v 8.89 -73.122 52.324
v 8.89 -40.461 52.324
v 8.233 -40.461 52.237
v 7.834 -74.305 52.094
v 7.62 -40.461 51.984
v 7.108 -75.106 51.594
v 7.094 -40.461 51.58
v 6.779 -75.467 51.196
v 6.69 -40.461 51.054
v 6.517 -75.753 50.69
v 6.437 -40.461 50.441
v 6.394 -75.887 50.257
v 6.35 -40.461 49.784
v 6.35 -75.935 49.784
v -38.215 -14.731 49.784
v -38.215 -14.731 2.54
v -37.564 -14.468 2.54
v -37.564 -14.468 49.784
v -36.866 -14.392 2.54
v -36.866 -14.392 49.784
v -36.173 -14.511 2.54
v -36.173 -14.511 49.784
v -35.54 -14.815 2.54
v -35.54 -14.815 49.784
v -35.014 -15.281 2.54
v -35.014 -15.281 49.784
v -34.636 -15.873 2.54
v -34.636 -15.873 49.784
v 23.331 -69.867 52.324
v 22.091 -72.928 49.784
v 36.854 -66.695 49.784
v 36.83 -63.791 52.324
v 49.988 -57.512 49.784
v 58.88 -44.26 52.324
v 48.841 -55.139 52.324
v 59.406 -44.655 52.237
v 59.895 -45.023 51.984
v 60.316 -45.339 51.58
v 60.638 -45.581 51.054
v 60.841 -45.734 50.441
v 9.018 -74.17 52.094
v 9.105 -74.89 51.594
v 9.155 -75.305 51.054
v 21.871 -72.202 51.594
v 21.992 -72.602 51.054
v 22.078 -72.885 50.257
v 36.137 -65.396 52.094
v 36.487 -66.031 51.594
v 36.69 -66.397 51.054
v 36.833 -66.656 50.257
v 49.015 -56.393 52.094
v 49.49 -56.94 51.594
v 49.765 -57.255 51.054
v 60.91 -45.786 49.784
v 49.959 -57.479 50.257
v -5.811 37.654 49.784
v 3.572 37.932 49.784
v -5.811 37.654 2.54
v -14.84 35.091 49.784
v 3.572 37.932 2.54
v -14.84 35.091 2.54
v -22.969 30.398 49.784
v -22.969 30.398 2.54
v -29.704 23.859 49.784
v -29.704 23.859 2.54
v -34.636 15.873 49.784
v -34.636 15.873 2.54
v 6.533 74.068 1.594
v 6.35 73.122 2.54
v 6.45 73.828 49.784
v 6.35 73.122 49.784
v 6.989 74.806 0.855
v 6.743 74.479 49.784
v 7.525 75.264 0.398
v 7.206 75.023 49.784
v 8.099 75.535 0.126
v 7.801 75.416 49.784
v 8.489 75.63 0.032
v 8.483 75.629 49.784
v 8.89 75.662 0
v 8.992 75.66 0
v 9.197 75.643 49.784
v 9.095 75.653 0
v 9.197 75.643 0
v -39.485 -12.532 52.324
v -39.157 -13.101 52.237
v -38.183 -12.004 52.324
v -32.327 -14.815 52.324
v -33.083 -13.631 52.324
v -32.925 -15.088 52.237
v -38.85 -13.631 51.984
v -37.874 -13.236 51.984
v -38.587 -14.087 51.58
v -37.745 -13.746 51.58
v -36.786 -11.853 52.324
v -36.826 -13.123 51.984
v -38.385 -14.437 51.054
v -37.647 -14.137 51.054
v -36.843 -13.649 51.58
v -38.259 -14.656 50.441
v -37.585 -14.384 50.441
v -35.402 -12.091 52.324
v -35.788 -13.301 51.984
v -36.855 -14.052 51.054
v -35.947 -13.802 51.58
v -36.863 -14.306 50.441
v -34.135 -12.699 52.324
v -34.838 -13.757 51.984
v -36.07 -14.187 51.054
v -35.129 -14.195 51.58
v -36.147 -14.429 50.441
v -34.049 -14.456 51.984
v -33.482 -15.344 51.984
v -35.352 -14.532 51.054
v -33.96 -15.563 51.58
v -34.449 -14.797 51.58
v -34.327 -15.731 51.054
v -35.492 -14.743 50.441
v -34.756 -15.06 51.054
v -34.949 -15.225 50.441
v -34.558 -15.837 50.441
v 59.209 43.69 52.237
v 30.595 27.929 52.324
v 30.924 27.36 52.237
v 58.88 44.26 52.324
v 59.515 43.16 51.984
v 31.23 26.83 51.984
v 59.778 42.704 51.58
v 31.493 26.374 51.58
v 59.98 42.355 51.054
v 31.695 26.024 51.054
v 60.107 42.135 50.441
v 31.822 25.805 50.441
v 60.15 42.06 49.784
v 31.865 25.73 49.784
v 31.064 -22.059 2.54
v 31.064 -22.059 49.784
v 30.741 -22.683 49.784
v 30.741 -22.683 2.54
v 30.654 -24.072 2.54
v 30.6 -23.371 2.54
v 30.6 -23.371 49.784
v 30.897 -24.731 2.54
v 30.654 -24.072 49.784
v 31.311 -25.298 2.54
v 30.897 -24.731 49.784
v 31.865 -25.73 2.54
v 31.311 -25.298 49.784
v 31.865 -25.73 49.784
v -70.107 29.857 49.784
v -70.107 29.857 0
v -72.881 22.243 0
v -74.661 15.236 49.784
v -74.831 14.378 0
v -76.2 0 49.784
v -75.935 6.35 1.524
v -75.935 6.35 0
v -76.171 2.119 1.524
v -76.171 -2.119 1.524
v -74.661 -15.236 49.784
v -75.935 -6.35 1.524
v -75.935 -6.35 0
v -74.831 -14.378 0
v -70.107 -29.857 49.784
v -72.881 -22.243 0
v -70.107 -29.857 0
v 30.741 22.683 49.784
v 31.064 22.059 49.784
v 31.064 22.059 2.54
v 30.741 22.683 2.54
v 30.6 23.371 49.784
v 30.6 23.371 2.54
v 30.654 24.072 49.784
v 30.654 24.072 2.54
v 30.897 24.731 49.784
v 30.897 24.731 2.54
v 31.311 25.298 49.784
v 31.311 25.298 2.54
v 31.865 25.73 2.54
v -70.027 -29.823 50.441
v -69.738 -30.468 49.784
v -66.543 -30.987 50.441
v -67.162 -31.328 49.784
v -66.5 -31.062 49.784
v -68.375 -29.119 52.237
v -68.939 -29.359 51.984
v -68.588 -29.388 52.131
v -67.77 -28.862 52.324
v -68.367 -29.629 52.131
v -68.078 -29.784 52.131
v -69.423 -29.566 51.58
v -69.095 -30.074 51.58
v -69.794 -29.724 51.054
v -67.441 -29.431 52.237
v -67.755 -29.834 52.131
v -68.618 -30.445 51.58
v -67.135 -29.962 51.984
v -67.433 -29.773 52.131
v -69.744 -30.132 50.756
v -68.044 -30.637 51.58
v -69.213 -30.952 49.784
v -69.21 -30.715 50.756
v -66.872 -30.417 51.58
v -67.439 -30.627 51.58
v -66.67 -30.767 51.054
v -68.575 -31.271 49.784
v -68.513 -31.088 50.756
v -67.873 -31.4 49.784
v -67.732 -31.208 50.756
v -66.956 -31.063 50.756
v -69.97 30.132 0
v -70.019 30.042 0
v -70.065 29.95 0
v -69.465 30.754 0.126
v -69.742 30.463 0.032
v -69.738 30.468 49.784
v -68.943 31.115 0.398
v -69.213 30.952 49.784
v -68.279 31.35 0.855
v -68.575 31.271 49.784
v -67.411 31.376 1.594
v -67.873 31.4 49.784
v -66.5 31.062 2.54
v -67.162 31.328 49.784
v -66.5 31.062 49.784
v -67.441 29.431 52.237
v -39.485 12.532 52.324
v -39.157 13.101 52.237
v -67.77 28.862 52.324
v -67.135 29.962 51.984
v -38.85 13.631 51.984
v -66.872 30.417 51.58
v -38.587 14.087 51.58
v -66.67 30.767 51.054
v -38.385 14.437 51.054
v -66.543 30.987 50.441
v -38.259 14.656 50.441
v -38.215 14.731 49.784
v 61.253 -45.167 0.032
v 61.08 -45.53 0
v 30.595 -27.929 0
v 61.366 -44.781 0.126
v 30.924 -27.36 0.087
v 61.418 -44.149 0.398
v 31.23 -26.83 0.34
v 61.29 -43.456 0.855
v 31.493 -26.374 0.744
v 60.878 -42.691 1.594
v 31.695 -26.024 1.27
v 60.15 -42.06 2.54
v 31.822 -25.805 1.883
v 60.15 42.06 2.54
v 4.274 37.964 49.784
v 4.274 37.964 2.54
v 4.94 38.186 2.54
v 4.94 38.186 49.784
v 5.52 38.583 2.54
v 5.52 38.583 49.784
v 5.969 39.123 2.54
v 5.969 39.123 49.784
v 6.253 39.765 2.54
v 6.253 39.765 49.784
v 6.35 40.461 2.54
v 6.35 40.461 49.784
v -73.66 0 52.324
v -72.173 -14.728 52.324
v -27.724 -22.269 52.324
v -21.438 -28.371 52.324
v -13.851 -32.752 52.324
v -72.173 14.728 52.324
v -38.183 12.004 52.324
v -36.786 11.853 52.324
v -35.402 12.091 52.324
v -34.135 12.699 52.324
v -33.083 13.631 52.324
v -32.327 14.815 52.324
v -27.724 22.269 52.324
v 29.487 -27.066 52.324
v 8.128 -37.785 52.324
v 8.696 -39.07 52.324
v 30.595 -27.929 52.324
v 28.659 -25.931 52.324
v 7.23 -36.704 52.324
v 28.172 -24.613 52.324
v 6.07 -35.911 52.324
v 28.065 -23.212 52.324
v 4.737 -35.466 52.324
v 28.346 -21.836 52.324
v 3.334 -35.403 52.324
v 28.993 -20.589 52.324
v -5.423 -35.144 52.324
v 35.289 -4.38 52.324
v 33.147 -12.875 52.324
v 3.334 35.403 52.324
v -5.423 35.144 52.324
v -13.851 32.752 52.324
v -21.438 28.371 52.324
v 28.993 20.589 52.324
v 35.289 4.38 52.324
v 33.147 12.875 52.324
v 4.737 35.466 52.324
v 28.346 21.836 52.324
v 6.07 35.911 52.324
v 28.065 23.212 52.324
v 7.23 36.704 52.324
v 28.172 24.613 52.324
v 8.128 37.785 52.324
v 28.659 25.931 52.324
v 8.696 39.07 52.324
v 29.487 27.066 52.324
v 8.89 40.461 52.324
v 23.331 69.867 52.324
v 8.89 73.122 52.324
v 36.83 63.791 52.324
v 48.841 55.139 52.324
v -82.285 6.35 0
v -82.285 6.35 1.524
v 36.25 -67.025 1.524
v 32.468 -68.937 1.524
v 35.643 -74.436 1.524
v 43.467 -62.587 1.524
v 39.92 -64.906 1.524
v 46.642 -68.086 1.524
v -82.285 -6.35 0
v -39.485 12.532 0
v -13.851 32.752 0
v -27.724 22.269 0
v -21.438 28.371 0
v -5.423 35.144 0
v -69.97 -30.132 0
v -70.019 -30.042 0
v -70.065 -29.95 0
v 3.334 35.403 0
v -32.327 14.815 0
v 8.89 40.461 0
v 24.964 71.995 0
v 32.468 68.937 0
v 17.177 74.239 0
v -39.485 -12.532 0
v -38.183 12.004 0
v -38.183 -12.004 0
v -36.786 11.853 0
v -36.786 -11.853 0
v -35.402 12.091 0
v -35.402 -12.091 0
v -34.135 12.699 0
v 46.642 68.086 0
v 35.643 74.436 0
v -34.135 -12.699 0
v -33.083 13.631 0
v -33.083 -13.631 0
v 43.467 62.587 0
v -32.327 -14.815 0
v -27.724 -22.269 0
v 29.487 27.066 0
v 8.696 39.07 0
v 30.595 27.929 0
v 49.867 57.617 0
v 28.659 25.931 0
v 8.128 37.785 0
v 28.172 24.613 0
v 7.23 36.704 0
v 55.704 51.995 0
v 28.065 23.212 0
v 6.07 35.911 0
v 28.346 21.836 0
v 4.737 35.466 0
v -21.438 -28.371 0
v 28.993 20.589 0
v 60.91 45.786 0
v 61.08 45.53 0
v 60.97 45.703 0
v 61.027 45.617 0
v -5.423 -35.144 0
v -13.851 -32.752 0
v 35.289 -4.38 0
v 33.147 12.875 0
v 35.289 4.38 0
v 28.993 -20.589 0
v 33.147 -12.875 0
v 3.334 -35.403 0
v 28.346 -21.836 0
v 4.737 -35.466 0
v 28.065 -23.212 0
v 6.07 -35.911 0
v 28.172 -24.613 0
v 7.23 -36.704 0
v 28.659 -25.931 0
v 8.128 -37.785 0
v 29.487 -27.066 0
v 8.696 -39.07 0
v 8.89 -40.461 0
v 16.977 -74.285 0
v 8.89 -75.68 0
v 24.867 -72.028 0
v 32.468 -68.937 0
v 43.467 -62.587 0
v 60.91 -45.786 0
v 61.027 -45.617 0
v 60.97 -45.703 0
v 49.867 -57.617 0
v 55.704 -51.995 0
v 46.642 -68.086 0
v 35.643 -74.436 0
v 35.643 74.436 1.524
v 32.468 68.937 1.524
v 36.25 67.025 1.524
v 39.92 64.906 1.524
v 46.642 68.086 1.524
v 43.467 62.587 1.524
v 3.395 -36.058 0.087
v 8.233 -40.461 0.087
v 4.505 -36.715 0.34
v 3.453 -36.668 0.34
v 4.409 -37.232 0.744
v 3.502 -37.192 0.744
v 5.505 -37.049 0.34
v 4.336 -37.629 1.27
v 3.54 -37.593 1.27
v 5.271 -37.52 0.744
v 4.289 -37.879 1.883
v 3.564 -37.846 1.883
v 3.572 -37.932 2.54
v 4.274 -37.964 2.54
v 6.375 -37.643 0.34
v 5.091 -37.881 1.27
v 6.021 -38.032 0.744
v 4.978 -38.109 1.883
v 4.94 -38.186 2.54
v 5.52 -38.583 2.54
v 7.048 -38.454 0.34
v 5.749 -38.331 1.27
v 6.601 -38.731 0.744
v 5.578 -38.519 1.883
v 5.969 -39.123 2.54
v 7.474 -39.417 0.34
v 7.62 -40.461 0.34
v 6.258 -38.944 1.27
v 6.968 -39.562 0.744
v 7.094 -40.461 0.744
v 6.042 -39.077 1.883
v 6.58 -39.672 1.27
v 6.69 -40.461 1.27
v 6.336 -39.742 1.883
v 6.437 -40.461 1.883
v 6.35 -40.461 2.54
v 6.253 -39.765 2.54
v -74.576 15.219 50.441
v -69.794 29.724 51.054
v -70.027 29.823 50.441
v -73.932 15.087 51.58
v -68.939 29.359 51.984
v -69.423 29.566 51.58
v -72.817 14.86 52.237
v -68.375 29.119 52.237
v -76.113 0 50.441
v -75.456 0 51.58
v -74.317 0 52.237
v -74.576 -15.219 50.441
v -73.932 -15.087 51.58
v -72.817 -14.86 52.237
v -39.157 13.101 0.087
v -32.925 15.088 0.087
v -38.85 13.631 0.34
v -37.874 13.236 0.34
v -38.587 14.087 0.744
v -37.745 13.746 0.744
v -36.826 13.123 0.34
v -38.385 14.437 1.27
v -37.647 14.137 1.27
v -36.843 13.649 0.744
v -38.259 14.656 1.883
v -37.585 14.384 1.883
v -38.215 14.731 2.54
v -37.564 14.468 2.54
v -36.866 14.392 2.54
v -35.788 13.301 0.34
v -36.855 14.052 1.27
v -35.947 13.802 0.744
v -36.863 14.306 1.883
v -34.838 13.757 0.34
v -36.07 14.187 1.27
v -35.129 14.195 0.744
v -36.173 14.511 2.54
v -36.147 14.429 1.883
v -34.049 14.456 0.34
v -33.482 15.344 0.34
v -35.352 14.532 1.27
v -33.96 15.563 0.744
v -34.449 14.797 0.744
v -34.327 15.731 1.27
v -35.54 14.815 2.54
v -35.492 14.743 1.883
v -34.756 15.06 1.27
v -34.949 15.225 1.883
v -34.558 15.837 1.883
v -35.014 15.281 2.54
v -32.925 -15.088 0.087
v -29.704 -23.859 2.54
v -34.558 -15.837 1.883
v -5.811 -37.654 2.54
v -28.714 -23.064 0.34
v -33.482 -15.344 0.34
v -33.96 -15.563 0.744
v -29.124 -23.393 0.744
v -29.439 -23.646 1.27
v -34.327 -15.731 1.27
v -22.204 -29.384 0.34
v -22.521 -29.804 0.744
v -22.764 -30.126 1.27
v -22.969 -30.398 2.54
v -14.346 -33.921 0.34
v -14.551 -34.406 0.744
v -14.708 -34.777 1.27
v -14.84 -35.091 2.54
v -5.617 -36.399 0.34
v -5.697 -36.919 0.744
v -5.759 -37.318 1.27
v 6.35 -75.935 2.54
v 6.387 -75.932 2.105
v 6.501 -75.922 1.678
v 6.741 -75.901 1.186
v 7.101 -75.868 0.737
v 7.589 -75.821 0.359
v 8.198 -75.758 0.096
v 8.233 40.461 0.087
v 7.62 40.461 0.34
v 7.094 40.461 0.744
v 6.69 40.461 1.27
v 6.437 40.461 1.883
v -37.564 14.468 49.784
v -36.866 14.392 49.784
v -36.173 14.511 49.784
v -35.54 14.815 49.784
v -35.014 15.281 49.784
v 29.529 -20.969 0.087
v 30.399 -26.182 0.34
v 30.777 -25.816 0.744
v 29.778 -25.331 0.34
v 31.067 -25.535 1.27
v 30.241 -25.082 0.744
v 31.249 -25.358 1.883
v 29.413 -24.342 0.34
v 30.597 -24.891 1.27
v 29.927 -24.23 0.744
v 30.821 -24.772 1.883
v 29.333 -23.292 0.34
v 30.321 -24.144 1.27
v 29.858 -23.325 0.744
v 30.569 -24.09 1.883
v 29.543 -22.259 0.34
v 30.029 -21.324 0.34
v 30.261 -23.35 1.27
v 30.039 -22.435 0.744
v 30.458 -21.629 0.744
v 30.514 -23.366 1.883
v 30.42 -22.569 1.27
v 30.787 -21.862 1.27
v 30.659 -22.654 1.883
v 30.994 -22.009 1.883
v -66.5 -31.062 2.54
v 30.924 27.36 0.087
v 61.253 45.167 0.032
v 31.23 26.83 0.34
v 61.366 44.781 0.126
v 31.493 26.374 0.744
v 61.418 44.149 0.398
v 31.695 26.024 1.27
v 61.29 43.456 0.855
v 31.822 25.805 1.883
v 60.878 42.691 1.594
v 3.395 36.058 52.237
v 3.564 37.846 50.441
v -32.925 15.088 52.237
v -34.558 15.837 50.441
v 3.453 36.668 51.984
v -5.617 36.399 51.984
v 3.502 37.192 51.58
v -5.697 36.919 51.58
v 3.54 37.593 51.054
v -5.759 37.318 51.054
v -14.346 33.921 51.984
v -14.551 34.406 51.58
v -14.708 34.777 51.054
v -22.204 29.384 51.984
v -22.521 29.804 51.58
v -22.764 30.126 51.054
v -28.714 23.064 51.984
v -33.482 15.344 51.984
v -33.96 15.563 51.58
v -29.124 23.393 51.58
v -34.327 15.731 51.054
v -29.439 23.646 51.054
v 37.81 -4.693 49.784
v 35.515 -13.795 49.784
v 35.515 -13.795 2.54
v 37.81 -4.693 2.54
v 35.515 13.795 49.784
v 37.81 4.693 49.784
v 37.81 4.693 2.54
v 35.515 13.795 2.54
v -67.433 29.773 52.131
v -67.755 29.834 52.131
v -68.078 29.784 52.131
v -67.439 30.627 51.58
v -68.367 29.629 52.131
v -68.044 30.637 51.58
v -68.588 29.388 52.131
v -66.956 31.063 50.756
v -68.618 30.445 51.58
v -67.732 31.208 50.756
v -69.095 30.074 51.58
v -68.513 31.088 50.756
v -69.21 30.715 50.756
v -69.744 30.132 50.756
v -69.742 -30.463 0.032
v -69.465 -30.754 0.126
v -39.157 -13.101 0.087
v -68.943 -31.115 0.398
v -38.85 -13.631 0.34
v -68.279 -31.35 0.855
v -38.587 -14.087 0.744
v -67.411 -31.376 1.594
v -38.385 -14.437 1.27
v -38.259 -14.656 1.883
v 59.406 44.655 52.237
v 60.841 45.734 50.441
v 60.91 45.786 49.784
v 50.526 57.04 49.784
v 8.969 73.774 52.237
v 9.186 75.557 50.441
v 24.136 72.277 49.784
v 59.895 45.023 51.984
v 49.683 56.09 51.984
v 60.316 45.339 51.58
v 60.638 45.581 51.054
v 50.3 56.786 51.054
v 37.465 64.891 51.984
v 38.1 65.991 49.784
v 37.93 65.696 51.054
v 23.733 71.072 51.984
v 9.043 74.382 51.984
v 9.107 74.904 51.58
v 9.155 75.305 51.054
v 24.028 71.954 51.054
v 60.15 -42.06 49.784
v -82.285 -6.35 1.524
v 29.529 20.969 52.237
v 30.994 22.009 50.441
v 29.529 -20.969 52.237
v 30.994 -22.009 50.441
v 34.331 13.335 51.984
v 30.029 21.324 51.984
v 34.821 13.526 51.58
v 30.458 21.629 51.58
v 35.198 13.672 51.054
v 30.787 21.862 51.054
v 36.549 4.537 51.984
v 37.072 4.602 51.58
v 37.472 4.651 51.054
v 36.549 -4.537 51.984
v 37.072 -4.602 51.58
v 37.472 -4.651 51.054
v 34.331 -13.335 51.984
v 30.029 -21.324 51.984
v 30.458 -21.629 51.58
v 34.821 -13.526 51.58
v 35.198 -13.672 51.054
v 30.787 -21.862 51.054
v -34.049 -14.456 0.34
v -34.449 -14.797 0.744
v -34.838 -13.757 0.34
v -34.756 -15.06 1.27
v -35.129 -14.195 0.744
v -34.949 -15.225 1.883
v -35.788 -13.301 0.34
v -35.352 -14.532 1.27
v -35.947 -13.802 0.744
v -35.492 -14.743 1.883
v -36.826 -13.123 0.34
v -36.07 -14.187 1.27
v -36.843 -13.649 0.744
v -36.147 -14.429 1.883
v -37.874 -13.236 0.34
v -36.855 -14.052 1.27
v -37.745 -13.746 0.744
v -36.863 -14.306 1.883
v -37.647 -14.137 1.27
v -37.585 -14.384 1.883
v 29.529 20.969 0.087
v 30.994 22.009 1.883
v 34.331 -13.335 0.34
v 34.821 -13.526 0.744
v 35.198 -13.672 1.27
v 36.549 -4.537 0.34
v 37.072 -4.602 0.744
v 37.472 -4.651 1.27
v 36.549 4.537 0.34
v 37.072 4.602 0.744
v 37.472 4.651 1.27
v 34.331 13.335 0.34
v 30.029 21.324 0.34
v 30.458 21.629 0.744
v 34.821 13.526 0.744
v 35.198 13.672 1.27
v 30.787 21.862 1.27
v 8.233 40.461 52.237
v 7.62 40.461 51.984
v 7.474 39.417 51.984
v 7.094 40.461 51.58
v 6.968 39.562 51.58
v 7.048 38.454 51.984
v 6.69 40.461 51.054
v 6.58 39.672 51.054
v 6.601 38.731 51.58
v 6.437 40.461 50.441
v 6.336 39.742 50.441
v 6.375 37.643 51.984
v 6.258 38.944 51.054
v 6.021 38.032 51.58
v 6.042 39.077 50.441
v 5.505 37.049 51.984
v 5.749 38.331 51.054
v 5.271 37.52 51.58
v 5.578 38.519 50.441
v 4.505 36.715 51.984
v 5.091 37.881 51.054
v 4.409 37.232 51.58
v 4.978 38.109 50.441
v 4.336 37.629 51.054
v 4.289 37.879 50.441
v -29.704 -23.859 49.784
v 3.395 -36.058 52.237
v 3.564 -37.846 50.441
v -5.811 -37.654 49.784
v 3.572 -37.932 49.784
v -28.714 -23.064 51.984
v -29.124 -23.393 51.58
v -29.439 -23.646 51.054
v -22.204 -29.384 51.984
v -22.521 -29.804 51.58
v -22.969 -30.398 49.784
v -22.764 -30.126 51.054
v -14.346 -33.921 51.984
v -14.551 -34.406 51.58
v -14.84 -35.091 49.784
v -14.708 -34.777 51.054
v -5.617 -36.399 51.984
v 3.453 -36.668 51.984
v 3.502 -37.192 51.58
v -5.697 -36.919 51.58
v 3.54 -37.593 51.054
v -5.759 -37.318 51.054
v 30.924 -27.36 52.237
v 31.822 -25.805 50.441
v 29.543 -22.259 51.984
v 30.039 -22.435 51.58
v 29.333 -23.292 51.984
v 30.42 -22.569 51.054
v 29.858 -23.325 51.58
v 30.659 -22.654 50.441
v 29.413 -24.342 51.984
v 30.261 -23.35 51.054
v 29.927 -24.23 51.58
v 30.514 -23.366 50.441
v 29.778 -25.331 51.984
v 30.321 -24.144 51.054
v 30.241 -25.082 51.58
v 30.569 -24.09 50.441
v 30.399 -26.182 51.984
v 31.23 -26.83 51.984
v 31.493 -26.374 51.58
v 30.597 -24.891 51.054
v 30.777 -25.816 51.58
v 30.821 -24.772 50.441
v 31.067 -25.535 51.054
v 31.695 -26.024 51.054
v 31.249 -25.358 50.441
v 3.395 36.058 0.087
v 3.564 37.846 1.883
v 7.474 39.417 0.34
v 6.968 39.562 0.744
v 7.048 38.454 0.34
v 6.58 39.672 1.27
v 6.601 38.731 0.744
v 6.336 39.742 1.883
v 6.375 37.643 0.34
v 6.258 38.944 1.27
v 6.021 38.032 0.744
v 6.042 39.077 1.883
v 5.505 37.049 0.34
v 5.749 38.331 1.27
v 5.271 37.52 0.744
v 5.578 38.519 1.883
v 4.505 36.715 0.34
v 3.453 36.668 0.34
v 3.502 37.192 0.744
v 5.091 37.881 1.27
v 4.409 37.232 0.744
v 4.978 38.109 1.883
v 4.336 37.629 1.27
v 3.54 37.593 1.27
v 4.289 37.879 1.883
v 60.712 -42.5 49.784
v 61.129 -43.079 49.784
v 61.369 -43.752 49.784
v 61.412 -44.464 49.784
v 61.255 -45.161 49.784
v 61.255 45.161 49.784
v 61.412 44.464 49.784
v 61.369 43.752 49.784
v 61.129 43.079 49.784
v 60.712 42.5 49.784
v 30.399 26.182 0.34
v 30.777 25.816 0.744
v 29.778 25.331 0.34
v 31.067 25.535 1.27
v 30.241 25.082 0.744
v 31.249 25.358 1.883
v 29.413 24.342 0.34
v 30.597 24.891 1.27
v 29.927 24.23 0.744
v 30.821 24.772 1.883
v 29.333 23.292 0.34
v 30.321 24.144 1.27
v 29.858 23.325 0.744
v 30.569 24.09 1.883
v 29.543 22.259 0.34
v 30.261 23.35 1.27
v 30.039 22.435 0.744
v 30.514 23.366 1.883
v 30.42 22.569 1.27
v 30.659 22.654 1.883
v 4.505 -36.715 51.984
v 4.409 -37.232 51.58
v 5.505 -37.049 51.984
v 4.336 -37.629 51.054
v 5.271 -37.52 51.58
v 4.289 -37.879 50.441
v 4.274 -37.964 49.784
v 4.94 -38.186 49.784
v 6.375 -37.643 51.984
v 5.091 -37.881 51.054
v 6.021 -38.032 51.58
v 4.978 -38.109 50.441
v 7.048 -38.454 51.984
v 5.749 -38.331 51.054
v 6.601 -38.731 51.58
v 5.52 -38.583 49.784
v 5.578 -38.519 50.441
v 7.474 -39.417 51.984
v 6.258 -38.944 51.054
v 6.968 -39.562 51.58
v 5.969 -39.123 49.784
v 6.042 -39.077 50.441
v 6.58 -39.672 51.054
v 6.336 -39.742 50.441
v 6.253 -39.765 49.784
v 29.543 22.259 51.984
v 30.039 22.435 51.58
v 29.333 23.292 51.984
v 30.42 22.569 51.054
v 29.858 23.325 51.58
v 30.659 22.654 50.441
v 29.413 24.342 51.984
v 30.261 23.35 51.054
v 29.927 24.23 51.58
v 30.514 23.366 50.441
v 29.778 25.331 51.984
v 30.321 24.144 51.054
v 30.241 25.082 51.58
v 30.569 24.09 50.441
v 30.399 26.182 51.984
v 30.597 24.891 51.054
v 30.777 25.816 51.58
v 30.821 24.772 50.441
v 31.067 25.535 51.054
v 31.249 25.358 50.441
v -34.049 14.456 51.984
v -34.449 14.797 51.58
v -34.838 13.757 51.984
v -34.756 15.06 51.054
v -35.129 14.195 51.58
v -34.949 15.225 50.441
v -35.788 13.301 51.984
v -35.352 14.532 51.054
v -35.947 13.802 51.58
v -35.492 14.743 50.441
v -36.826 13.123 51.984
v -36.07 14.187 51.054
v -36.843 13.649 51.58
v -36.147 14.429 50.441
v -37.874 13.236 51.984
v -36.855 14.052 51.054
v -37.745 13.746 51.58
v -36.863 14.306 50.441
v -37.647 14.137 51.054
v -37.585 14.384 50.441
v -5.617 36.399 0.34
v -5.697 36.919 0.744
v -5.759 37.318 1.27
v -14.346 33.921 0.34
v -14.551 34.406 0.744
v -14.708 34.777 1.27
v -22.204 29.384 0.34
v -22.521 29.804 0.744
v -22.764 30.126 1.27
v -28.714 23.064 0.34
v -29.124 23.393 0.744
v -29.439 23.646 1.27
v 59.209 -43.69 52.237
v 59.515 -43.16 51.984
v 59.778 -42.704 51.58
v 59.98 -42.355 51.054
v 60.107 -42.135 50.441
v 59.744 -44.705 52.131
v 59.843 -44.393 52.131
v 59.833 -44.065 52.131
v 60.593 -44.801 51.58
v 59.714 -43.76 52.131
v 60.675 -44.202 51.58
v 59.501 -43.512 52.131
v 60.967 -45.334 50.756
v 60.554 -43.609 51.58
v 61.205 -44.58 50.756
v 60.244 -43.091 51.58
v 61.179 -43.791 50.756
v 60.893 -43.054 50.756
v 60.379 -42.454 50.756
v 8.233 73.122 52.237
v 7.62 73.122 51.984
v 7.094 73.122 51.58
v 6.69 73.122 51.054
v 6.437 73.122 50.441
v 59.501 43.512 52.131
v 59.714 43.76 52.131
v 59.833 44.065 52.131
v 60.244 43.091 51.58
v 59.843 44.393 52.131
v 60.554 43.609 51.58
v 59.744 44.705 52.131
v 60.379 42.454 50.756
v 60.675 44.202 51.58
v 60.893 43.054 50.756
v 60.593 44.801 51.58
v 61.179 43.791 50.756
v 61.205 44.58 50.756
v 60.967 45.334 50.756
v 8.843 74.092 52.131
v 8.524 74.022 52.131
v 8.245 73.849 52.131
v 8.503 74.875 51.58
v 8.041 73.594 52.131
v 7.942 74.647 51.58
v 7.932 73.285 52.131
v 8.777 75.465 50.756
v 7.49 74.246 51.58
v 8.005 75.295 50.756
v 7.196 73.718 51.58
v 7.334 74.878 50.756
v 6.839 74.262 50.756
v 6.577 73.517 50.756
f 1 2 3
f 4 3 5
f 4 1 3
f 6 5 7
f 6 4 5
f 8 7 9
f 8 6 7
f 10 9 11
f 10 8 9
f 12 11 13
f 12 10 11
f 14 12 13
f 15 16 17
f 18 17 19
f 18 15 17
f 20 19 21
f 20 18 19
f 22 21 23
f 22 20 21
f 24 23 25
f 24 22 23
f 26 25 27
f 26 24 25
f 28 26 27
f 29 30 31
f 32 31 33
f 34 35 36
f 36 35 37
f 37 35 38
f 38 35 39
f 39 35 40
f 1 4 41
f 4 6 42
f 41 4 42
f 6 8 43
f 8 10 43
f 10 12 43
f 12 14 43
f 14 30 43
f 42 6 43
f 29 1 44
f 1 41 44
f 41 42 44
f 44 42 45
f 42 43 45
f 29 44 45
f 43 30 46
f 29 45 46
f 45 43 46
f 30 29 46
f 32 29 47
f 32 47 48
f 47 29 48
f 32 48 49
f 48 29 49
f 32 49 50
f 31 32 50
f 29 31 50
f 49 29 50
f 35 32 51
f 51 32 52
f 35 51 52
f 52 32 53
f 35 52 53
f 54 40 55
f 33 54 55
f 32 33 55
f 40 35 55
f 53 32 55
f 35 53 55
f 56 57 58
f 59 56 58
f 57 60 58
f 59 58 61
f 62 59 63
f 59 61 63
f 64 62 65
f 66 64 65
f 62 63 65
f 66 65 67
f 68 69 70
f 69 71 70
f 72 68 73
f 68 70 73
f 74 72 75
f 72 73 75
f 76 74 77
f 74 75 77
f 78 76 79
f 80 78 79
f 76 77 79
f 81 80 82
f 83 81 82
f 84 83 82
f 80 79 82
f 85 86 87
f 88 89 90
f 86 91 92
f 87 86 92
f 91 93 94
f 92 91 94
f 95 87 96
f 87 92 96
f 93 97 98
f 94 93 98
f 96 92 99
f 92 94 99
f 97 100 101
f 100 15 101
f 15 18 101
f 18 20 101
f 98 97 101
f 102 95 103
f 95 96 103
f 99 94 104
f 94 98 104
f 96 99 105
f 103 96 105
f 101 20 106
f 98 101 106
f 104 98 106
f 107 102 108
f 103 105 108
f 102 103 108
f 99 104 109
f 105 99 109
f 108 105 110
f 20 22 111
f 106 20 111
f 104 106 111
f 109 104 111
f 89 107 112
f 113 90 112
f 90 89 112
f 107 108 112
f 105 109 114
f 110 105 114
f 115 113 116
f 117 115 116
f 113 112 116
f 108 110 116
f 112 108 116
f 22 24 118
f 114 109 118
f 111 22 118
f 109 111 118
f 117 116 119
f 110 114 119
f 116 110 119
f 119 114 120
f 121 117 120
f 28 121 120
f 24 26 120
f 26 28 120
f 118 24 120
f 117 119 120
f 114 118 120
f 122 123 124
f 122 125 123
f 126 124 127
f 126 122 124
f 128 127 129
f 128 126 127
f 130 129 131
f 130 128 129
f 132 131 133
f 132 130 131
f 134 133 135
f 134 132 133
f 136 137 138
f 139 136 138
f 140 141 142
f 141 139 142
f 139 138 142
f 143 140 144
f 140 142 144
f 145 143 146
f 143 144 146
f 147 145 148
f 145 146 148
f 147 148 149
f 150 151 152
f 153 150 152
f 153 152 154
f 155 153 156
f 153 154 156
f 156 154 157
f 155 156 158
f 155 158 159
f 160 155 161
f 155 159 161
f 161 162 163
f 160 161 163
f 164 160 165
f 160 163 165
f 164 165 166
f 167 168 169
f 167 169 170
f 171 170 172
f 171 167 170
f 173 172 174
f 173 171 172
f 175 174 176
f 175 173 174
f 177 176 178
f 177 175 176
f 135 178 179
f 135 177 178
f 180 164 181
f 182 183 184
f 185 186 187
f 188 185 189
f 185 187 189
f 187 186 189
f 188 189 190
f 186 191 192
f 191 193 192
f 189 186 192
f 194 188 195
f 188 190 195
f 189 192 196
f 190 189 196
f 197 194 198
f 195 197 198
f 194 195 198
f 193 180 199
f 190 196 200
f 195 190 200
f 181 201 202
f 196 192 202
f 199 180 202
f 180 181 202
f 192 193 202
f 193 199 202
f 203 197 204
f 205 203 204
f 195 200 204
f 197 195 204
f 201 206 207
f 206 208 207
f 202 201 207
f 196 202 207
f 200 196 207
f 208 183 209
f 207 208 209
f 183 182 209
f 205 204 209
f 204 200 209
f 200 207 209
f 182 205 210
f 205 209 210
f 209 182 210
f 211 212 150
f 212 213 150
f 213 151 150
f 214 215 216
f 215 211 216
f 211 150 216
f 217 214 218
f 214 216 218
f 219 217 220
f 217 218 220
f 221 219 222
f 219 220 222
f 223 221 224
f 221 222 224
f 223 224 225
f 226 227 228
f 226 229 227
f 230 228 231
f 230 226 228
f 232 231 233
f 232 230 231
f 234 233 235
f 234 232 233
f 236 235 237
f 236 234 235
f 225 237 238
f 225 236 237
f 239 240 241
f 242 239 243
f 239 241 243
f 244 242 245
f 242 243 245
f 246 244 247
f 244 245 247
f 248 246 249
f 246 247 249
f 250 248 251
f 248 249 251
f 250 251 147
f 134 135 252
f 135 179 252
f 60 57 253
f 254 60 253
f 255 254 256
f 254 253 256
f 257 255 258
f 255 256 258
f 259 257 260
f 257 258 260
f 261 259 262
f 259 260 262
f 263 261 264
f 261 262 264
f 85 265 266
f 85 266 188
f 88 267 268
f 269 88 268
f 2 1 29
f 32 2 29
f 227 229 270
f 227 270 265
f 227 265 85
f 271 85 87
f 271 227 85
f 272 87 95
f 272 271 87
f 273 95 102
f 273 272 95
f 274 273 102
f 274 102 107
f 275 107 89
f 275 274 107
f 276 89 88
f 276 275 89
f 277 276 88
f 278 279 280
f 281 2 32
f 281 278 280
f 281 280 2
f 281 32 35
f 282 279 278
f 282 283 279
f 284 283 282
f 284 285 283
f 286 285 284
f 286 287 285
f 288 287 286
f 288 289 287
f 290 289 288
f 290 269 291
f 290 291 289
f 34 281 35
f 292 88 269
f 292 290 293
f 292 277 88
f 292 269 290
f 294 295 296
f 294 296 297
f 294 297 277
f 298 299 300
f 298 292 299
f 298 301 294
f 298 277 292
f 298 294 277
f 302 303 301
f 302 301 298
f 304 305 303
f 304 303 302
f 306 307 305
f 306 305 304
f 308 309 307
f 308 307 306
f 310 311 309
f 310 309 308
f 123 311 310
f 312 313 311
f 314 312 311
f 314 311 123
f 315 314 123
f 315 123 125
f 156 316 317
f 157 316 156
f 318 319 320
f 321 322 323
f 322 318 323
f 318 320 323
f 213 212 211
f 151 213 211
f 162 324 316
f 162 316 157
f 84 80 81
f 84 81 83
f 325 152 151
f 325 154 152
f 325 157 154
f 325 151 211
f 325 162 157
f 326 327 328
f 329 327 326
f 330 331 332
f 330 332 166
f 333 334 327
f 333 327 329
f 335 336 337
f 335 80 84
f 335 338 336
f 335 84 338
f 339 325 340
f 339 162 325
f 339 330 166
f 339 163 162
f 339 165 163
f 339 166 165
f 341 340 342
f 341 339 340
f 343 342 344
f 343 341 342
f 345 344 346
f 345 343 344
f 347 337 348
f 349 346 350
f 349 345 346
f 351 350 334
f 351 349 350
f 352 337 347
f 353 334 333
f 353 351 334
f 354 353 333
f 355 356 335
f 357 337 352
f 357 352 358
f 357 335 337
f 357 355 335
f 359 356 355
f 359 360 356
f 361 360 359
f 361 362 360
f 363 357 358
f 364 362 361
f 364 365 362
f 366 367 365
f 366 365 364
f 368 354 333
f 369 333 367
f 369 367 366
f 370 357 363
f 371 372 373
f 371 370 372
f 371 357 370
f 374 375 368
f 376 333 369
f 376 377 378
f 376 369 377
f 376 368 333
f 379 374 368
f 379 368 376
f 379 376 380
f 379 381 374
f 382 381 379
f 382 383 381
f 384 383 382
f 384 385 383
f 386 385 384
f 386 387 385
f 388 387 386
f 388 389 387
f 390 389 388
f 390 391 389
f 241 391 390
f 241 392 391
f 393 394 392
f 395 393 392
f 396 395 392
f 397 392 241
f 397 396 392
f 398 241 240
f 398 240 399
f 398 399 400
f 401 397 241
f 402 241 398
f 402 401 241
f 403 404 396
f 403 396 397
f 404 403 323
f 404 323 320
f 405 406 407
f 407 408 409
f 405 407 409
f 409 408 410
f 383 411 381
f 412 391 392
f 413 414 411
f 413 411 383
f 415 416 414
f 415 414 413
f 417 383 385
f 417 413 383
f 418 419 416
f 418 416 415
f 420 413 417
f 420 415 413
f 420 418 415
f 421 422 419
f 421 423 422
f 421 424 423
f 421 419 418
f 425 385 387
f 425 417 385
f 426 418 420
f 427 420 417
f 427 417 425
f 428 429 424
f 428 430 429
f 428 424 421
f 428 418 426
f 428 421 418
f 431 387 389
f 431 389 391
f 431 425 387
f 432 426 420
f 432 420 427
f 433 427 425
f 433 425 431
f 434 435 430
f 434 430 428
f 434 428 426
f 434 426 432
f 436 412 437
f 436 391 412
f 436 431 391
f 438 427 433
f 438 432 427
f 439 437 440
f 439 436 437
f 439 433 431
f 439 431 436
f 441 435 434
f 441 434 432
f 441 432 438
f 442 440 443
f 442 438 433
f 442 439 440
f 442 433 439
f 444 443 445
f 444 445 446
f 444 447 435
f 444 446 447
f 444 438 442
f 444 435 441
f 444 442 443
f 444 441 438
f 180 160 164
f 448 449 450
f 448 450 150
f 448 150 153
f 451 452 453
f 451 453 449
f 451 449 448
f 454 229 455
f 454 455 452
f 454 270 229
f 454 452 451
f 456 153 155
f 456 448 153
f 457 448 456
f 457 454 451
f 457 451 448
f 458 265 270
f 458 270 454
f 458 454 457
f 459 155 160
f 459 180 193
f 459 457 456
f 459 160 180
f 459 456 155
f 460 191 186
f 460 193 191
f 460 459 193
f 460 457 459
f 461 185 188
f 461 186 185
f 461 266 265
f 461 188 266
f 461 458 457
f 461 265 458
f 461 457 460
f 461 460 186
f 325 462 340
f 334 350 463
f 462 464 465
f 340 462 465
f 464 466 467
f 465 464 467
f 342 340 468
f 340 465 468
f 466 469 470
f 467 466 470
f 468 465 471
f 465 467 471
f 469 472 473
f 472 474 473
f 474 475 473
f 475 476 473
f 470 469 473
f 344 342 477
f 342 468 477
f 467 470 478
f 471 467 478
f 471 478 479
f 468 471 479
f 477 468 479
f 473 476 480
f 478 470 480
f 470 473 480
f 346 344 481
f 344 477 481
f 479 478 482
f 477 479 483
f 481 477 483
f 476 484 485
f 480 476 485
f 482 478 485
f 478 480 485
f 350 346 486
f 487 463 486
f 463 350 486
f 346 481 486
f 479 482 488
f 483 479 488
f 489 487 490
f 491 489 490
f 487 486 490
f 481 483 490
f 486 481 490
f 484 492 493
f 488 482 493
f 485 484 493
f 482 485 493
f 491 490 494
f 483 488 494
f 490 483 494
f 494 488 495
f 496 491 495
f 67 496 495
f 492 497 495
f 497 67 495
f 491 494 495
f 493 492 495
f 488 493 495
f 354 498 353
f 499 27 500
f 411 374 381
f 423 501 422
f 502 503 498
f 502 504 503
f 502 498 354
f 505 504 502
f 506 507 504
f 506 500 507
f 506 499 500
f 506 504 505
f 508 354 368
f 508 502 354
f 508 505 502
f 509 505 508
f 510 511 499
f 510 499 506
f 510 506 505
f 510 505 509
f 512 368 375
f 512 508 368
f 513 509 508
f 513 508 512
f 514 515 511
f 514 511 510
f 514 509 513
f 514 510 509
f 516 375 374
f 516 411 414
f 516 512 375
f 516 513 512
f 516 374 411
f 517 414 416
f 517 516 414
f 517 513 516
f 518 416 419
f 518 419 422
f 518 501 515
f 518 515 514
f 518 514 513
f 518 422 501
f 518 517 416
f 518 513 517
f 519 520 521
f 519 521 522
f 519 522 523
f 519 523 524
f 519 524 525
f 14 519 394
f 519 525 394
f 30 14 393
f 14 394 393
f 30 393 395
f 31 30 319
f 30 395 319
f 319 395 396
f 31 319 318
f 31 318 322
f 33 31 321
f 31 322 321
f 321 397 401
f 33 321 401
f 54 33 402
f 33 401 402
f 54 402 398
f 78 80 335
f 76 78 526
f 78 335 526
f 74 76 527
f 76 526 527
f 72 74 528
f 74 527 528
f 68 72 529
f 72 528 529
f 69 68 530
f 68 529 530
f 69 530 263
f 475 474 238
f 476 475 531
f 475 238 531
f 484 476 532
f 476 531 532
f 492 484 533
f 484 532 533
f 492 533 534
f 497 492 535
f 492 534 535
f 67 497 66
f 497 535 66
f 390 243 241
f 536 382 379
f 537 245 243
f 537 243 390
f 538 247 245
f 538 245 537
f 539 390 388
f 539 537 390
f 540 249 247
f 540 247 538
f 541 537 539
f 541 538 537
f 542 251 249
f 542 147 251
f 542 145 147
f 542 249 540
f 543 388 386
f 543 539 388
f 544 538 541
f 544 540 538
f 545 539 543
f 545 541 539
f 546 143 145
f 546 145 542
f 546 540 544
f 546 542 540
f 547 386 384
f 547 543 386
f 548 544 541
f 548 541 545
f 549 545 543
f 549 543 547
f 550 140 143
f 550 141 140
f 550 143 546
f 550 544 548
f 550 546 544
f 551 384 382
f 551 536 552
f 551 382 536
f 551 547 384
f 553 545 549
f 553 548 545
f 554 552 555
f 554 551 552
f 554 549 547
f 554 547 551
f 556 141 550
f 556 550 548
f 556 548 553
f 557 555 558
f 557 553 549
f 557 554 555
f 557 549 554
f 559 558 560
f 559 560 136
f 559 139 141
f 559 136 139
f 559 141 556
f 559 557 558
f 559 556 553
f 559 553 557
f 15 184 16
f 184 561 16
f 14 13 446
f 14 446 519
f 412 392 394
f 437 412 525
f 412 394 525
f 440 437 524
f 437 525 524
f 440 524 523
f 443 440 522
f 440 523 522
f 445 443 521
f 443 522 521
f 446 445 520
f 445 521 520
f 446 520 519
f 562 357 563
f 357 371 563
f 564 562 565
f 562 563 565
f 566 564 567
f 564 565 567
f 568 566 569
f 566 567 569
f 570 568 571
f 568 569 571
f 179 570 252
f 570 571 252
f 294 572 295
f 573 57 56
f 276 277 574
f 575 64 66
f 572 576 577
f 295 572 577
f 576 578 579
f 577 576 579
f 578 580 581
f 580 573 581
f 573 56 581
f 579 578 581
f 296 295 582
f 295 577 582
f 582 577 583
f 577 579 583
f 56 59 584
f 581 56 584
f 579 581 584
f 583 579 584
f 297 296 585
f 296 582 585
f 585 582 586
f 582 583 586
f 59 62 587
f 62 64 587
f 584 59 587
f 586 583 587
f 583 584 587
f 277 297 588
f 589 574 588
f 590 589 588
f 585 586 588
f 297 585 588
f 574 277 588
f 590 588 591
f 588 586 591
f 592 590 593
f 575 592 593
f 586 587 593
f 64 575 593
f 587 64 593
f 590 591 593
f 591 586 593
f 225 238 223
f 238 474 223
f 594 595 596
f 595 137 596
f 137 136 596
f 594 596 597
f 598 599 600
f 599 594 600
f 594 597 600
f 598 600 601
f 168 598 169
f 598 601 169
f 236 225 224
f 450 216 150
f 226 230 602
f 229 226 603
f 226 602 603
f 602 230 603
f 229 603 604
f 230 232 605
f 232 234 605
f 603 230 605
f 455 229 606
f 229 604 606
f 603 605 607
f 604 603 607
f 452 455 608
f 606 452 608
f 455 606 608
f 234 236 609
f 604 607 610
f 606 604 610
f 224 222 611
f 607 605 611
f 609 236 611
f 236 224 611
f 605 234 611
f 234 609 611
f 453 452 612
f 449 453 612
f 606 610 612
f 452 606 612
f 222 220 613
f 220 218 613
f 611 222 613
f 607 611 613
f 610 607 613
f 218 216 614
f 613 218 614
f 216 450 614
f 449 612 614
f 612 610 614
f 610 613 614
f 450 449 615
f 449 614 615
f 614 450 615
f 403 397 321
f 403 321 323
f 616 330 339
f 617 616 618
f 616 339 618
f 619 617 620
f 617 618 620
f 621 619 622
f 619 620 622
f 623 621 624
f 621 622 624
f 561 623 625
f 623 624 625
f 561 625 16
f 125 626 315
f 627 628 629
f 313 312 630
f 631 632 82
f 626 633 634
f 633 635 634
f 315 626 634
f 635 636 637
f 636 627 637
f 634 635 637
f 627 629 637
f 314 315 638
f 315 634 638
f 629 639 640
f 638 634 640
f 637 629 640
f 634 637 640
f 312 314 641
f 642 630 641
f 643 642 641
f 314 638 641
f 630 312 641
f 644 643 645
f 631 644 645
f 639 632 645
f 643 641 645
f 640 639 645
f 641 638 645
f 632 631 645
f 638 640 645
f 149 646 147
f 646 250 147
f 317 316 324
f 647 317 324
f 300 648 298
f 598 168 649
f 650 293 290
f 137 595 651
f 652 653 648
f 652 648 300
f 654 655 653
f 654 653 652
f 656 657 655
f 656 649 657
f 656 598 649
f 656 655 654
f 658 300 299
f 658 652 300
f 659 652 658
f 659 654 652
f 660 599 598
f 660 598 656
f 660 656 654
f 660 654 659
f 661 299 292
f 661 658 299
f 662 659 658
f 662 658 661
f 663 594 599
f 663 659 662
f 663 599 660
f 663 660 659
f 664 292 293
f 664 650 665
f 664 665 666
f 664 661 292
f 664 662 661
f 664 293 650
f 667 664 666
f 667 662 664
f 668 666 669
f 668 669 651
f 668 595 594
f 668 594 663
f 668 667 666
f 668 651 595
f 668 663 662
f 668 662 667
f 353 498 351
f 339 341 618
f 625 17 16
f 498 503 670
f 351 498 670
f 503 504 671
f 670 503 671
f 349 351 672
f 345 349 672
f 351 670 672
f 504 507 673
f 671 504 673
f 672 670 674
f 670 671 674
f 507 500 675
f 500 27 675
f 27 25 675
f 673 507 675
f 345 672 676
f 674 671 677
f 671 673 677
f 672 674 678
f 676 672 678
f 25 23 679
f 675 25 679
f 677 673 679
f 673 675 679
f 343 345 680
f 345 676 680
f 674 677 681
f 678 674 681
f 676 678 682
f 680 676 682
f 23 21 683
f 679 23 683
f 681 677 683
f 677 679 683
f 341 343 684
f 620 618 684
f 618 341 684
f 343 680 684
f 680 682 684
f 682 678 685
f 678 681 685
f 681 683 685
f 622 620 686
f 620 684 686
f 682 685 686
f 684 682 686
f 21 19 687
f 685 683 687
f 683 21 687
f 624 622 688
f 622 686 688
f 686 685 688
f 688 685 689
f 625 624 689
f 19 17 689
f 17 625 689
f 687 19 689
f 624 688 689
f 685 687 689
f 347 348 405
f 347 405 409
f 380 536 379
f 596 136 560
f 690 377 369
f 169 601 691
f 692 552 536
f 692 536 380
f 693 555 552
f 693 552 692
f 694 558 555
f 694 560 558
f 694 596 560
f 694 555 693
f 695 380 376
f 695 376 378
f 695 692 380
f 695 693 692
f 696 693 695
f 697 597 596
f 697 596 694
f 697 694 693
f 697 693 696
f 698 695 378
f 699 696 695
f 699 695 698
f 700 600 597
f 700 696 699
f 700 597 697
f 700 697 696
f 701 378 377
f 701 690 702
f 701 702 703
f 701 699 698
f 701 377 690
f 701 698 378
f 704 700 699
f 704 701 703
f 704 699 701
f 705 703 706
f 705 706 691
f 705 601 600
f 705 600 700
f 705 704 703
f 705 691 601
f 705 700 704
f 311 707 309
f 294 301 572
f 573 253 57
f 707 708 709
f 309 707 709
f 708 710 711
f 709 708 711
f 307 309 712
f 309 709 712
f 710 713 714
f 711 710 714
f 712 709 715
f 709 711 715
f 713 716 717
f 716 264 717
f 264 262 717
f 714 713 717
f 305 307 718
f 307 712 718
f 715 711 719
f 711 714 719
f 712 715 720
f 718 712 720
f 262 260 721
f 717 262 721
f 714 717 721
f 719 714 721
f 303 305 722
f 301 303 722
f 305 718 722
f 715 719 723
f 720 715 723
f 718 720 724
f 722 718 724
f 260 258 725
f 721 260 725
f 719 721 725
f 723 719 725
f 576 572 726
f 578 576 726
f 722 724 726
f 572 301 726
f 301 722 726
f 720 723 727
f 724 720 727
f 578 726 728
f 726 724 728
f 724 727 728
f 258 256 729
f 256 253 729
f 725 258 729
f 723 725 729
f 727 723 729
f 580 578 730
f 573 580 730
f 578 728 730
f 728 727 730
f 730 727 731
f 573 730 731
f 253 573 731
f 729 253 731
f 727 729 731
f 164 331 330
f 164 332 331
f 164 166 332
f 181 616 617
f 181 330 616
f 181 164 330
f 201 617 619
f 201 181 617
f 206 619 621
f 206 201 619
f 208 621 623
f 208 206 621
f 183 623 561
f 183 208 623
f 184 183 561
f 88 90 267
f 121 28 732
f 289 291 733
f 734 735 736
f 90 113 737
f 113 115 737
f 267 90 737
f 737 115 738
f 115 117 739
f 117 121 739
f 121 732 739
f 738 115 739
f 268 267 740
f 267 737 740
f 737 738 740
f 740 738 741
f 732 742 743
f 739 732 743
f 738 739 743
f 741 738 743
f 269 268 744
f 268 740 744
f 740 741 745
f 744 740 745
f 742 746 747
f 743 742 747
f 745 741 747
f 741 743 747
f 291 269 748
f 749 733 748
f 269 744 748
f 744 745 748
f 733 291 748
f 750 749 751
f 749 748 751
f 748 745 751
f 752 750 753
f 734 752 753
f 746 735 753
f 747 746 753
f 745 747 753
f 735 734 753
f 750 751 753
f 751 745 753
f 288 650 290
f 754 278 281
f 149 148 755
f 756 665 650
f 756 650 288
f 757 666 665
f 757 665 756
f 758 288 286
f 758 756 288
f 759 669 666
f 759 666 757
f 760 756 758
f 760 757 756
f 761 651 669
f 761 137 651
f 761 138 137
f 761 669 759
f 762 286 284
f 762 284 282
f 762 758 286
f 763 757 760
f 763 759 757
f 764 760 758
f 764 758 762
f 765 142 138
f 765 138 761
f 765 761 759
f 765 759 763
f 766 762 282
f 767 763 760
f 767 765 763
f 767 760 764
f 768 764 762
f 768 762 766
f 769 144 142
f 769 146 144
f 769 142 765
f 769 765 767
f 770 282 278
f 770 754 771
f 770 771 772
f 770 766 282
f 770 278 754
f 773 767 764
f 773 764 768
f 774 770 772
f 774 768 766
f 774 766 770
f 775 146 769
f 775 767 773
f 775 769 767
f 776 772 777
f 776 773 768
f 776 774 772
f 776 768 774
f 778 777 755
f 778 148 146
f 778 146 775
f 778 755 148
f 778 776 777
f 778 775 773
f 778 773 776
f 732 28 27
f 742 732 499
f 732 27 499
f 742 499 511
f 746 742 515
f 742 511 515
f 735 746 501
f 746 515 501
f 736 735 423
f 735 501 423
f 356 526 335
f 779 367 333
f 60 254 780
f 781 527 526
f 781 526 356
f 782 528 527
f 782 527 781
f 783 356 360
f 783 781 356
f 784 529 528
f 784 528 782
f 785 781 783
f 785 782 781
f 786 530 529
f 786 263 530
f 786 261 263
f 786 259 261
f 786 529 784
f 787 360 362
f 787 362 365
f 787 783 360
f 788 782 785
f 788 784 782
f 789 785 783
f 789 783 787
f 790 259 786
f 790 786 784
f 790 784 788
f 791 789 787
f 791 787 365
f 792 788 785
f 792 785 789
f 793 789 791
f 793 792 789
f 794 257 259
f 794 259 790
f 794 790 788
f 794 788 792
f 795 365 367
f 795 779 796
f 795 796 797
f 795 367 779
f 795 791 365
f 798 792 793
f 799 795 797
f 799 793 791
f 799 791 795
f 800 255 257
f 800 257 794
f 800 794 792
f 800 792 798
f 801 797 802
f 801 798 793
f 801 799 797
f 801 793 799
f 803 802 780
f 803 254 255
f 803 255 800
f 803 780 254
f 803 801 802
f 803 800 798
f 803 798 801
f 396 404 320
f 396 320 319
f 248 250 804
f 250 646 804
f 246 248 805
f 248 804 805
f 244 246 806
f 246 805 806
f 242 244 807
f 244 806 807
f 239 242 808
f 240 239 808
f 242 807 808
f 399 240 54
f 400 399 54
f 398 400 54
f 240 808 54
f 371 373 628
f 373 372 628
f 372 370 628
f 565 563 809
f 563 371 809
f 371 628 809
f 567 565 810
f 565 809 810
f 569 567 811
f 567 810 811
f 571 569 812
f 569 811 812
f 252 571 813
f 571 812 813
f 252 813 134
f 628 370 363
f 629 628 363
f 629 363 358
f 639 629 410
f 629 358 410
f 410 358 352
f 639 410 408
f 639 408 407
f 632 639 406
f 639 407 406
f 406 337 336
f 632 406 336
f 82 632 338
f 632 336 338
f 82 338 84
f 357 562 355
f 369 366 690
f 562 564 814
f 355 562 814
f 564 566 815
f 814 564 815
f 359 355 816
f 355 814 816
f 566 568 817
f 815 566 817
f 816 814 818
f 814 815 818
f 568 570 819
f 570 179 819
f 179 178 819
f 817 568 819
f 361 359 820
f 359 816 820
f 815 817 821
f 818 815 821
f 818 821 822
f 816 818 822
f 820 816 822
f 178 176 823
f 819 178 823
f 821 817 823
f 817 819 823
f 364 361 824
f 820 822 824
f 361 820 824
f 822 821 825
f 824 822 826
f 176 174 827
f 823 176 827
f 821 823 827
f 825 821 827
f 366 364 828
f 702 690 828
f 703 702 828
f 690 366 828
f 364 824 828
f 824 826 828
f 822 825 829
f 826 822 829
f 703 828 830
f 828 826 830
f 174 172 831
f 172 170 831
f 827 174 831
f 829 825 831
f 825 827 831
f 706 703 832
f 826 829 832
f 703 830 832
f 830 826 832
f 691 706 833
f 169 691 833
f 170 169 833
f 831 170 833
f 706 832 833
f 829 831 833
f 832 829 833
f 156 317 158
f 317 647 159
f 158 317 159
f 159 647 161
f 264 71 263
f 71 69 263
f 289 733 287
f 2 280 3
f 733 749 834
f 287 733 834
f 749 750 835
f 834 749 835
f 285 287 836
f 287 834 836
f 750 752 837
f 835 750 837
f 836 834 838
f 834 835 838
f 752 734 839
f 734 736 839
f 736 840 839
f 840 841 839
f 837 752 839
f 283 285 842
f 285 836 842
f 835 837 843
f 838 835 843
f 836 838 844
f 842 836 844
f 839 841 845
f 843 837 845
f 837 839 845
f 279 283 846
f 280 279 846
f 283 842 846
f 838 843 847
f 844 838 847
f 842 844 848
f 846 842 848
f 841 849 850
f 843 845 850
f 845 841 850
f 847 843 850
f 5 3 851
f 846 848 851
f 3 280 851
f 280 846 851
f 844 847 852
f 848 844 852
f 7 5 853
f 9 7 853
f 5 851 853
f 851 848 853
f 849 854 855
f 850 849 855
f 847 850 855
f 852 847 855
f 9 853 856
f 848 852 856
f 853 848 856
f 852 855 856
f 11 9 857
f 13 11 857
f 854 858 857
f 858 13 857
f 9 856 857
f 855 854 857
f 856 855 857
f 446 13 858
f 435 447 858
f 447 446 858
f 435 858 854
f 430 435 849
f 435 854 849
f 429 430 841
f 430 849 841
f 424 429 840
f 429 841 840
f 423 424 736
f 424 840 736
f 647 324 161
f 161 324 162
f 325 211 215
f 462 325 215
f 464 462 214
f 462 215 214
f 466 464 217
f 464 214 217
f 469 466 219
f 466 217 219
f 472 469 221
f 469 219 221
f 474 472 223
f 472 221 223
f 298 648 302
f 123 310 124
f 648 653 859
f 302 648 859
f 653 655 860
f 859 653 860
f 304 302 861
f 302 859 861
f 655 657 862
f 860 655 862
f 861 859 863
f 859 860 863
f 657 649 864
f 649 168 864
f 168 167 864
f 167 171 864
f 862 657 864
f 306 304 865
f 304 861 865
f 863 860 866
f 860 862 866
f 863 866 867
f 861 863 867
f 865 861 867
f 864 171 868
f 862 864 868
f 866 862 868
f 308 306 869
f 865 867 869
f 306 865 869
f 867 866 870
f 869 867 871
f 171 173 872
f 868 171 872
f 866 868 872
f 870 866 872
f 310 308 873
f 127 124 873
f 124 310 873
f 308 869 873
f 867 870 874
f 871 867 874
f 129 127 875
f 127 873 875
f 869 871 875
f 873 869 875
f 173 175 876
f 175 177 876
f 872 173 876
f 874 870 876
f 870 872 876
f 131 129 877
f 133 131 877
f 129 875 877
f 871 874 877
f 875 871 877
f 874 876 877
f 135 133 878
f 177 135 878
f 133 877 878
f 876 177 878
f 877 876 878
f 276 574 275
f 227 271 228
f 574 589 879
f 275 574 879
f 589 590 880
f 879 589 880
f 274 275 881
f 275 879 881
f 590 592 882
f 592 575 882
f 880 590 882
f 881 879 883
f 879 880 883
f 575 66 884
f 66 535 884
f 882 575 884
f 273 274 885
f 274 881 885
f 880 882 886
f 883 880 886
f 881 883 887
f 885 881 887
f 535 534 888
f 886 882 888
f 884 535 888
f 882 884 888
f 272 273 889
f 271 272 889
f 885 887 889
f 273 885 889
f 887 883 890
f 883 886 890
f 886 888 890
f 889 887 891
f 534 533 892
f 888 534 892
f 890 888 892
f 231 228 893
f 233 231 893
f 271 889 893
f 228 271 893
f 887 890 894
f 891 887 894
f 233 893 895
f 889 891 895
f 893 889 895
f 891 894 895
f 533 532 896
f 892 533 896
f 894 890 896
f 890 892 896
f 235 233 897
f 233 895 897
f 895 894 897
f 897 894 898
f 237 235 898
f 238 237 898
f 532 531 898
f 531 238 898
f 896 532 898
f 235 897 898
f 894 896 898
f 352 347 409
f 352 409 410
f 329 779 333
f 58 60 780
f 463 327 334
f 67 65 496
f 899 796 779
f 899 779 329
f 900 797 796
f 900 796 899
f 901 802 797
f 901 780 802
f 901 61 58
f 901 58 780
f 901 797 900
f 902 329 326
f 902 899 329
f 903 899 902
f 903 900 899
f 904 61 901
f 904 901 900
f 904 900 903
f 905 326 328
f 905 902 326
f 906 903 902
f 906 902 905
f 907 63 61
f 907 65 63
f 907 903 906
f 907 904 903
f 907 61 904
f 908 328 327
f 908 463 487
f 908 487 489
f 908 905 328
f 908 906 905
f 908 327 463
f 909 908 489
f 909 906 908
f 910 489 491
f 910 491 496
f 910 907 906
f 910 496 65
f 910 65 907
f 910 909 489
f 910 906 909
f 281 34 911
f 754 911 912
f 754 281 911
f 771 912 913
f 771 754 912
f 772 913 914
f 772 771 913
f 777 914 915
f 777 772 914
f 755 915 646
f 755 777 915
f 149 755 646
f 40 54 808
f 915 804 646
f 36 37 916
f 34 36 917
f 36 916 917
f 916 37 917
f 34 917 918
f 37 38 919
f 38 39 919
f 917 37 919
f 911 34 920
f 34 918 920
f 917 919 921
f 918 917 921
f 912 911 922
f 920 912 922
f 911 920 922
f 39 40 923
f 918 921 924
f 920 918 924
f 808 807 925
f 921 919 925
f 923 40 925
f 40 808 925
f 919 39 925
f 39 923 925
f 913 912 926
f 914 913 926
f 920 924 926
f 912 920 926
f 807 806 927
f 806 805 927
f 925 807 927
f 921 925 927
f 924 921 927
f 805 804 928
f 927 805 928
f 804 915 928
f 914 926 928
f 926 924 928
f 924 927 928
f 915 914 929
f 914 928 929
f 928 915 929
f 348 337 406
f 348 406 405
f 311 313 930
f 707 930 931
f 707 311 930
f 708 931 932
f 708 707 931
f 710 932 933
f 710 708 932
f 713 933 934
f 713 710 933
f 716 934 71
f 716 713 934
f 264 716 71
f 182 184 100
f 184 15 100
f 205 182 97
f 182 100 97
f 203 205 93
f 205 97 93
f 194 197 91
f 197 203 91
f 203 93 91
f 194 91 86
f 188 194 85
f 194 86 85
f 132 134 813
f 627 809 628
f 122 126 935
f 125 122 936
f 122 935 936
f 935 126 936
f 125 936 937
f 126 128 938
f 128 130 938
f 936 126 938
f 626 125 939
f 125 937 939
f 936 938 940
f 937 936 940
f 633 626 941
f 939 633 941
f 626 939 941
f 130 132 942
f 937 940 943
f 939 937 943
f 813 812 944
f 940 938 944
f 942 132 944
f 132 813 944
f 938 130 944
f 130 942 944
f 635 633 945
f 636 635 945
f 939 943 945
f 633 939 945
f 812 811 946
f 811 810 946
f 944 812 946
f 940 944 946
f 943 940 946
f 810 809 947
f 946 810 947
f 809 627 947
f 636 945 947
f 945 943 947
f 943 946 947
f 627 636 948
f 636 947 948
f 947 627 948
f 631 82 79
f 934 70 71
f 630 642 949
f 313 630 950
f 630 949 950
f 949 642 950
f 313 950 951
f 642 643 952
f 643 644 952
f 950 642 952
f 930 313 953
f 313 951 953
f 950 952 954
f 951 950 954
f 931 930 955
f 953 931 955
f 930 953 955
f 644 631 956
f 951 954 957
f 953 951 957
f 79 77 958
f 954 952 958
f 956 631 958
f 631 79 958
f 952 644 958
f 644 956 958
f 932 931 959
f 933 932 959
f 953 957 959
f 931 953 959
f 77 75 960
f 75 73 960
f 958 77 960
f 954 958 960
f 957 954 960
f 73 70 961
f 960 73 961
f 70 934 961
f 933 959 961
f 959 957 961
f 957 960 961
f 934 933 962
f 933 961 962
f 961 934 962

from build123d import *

# Parameters (mm, degrees)
F0_R     = 38.1
F1_DEPTH = 52.324
F3_DEPTH = 52.324
F4_W     = 6.35
F4_H     = 12.7
F5_DEPTH = 1.524
F6_R     = 2.54


with BuildPart() as f1:
    # F0 (on Top) → F1 (new body)
    with BuildSketch(Plane.XY):
        Circle(F0_R)
    extrude(amount=F1_DEPTH)

    # F2 (on Top) → F3 (join, through all)
    with BuildSketch(Plane.XY):
        with BuildLine():
            Line((6.35, -37.5671066227), (6.35, -75.9349557187))
            ThreePointArc((6.35, -75.9349557187), (38.1000001588, -65.9911356767), (62.5866008968, -43.4667388722))
            Line((62.5866008968, -43.4667388722), (29.3590689181, -24.2828143398))
            ThreePointArc((29.3590689181, -24.2828143398), (19.0500001605, -32.9955677915), (6.35, -37.5671066227))
        make_face()
        with BuildLine():
            ThreePointArc((6.3499996346, 37.5671066844), (19.0499998395, 32.9955679768), (29.3590686819, 24.2828146254))
            Line((29.3590686819, 24.2828146254), (62.5866006876, 43.4667391734))
            ThreePointArc((62.5866006876, 43.4667391734), (38.0999998412, 65.99113586), (6.3499996346, 75.9349557492))
            Line((6.3499996346, 75.9349557492), (6.3499996346, 37.5671066844))
        make_face()
        with BuildLine():
            ThreePointArc((-35.7090685527, -13.2842923446), (-38.1, -1.853e-07), (-35.7090686819, 13.2842919973))
            Line((-35.7090686819, 13.2842919973), (-68.9366006876, 32.4682165453))
            ThreePointArc((-68.9366006876, 32.4682165453), (-76.2, -1.833e-07), (-68.9366005314, -32.468216877))
            Line((-68.9366005314, -32.468216877), (-35.7090685527, -13.2842923446))
        make_face()
    extrude(amount=F3_DEPTH)

    # F4 (on face) → F5 (join)
    with BuildSketch(Plane(origin=(0, 0, 0), x_dir=(1, 0, 0), z_dir=(0, 0, -1))):
        with Locations((-79.1099557187, 0)):
            Rectangle(F4_W, F4_H)
        Polygon((43.4667391734, -62.5866006876), (32.4682165453, -68.9366006876), (35.6432165453, -74.4358620017), (46.6417391734, -68.0858620017), align=None)
        Polygon((32.4682165453, 68.9366006876), (43.4667391734, 62.5866006876), (46.6417391734, 68.0858620017), (35.6432165453, 74.4358620017), align=None)
    extrude(amount=-F5_DEPTH)

    # F6
    f6_edges = [f1.edges().sort_by_distance(p)[0] for p in [
        (38.1, 0, 52.324),
        (45.972835, 33.874777, 52.324),
        (38.1, 65.991136, 52.324),
        (6.35, 56.751031, 52.324),
        (-19.05, 32.995568, 52.324),
        (-52.322835, 22.876254, 52.324),
        (-76.2, 0, 52.324),
        (-52.322835, -22.876255, 52.324),
        (-19.05, -32.995568, 52.324),
        (6.35, -56.751031, 52.324),
        (38.1, -65.991136, 52.324),
        (45.972835, -33.874777, 52.324),
        (6.35, -37.567107, 26.162),
        (-35.709069, -13.284292, 26.162),
        (-19.05, -32.995568, 0),
        (-68.936601, -32.468217, 26.162),
        (-19.05, 32.995568, 0),
        (-35.709069, 13.284292, 26.162),
        (6.35, 37.567107, 26.162),
        (-68.936601, 32.468217, 26.162),
        (6.35, 75.934956, 26.162),
        (38.1, 0, 0),
        (29.359069, -24.282814, 26.162),
        (29.359069, 24.282815, 26.162),
        (62.586601, 43.466739, 26.162),
        (62.586601, -43.466739, 26.162),
        (45.972835, 33.874777, 0),
        (6.35, 56.751031, 0),
        (-52.322835, 22.876254, 0),
        (-52.322835, -22.876255, 0),
        (6.35, -56.751031, 0),
        (45.972835, -33.874777, 0),
    ]]
    fillet(f6_edges, radius=F6_R)


solid = f1.part
